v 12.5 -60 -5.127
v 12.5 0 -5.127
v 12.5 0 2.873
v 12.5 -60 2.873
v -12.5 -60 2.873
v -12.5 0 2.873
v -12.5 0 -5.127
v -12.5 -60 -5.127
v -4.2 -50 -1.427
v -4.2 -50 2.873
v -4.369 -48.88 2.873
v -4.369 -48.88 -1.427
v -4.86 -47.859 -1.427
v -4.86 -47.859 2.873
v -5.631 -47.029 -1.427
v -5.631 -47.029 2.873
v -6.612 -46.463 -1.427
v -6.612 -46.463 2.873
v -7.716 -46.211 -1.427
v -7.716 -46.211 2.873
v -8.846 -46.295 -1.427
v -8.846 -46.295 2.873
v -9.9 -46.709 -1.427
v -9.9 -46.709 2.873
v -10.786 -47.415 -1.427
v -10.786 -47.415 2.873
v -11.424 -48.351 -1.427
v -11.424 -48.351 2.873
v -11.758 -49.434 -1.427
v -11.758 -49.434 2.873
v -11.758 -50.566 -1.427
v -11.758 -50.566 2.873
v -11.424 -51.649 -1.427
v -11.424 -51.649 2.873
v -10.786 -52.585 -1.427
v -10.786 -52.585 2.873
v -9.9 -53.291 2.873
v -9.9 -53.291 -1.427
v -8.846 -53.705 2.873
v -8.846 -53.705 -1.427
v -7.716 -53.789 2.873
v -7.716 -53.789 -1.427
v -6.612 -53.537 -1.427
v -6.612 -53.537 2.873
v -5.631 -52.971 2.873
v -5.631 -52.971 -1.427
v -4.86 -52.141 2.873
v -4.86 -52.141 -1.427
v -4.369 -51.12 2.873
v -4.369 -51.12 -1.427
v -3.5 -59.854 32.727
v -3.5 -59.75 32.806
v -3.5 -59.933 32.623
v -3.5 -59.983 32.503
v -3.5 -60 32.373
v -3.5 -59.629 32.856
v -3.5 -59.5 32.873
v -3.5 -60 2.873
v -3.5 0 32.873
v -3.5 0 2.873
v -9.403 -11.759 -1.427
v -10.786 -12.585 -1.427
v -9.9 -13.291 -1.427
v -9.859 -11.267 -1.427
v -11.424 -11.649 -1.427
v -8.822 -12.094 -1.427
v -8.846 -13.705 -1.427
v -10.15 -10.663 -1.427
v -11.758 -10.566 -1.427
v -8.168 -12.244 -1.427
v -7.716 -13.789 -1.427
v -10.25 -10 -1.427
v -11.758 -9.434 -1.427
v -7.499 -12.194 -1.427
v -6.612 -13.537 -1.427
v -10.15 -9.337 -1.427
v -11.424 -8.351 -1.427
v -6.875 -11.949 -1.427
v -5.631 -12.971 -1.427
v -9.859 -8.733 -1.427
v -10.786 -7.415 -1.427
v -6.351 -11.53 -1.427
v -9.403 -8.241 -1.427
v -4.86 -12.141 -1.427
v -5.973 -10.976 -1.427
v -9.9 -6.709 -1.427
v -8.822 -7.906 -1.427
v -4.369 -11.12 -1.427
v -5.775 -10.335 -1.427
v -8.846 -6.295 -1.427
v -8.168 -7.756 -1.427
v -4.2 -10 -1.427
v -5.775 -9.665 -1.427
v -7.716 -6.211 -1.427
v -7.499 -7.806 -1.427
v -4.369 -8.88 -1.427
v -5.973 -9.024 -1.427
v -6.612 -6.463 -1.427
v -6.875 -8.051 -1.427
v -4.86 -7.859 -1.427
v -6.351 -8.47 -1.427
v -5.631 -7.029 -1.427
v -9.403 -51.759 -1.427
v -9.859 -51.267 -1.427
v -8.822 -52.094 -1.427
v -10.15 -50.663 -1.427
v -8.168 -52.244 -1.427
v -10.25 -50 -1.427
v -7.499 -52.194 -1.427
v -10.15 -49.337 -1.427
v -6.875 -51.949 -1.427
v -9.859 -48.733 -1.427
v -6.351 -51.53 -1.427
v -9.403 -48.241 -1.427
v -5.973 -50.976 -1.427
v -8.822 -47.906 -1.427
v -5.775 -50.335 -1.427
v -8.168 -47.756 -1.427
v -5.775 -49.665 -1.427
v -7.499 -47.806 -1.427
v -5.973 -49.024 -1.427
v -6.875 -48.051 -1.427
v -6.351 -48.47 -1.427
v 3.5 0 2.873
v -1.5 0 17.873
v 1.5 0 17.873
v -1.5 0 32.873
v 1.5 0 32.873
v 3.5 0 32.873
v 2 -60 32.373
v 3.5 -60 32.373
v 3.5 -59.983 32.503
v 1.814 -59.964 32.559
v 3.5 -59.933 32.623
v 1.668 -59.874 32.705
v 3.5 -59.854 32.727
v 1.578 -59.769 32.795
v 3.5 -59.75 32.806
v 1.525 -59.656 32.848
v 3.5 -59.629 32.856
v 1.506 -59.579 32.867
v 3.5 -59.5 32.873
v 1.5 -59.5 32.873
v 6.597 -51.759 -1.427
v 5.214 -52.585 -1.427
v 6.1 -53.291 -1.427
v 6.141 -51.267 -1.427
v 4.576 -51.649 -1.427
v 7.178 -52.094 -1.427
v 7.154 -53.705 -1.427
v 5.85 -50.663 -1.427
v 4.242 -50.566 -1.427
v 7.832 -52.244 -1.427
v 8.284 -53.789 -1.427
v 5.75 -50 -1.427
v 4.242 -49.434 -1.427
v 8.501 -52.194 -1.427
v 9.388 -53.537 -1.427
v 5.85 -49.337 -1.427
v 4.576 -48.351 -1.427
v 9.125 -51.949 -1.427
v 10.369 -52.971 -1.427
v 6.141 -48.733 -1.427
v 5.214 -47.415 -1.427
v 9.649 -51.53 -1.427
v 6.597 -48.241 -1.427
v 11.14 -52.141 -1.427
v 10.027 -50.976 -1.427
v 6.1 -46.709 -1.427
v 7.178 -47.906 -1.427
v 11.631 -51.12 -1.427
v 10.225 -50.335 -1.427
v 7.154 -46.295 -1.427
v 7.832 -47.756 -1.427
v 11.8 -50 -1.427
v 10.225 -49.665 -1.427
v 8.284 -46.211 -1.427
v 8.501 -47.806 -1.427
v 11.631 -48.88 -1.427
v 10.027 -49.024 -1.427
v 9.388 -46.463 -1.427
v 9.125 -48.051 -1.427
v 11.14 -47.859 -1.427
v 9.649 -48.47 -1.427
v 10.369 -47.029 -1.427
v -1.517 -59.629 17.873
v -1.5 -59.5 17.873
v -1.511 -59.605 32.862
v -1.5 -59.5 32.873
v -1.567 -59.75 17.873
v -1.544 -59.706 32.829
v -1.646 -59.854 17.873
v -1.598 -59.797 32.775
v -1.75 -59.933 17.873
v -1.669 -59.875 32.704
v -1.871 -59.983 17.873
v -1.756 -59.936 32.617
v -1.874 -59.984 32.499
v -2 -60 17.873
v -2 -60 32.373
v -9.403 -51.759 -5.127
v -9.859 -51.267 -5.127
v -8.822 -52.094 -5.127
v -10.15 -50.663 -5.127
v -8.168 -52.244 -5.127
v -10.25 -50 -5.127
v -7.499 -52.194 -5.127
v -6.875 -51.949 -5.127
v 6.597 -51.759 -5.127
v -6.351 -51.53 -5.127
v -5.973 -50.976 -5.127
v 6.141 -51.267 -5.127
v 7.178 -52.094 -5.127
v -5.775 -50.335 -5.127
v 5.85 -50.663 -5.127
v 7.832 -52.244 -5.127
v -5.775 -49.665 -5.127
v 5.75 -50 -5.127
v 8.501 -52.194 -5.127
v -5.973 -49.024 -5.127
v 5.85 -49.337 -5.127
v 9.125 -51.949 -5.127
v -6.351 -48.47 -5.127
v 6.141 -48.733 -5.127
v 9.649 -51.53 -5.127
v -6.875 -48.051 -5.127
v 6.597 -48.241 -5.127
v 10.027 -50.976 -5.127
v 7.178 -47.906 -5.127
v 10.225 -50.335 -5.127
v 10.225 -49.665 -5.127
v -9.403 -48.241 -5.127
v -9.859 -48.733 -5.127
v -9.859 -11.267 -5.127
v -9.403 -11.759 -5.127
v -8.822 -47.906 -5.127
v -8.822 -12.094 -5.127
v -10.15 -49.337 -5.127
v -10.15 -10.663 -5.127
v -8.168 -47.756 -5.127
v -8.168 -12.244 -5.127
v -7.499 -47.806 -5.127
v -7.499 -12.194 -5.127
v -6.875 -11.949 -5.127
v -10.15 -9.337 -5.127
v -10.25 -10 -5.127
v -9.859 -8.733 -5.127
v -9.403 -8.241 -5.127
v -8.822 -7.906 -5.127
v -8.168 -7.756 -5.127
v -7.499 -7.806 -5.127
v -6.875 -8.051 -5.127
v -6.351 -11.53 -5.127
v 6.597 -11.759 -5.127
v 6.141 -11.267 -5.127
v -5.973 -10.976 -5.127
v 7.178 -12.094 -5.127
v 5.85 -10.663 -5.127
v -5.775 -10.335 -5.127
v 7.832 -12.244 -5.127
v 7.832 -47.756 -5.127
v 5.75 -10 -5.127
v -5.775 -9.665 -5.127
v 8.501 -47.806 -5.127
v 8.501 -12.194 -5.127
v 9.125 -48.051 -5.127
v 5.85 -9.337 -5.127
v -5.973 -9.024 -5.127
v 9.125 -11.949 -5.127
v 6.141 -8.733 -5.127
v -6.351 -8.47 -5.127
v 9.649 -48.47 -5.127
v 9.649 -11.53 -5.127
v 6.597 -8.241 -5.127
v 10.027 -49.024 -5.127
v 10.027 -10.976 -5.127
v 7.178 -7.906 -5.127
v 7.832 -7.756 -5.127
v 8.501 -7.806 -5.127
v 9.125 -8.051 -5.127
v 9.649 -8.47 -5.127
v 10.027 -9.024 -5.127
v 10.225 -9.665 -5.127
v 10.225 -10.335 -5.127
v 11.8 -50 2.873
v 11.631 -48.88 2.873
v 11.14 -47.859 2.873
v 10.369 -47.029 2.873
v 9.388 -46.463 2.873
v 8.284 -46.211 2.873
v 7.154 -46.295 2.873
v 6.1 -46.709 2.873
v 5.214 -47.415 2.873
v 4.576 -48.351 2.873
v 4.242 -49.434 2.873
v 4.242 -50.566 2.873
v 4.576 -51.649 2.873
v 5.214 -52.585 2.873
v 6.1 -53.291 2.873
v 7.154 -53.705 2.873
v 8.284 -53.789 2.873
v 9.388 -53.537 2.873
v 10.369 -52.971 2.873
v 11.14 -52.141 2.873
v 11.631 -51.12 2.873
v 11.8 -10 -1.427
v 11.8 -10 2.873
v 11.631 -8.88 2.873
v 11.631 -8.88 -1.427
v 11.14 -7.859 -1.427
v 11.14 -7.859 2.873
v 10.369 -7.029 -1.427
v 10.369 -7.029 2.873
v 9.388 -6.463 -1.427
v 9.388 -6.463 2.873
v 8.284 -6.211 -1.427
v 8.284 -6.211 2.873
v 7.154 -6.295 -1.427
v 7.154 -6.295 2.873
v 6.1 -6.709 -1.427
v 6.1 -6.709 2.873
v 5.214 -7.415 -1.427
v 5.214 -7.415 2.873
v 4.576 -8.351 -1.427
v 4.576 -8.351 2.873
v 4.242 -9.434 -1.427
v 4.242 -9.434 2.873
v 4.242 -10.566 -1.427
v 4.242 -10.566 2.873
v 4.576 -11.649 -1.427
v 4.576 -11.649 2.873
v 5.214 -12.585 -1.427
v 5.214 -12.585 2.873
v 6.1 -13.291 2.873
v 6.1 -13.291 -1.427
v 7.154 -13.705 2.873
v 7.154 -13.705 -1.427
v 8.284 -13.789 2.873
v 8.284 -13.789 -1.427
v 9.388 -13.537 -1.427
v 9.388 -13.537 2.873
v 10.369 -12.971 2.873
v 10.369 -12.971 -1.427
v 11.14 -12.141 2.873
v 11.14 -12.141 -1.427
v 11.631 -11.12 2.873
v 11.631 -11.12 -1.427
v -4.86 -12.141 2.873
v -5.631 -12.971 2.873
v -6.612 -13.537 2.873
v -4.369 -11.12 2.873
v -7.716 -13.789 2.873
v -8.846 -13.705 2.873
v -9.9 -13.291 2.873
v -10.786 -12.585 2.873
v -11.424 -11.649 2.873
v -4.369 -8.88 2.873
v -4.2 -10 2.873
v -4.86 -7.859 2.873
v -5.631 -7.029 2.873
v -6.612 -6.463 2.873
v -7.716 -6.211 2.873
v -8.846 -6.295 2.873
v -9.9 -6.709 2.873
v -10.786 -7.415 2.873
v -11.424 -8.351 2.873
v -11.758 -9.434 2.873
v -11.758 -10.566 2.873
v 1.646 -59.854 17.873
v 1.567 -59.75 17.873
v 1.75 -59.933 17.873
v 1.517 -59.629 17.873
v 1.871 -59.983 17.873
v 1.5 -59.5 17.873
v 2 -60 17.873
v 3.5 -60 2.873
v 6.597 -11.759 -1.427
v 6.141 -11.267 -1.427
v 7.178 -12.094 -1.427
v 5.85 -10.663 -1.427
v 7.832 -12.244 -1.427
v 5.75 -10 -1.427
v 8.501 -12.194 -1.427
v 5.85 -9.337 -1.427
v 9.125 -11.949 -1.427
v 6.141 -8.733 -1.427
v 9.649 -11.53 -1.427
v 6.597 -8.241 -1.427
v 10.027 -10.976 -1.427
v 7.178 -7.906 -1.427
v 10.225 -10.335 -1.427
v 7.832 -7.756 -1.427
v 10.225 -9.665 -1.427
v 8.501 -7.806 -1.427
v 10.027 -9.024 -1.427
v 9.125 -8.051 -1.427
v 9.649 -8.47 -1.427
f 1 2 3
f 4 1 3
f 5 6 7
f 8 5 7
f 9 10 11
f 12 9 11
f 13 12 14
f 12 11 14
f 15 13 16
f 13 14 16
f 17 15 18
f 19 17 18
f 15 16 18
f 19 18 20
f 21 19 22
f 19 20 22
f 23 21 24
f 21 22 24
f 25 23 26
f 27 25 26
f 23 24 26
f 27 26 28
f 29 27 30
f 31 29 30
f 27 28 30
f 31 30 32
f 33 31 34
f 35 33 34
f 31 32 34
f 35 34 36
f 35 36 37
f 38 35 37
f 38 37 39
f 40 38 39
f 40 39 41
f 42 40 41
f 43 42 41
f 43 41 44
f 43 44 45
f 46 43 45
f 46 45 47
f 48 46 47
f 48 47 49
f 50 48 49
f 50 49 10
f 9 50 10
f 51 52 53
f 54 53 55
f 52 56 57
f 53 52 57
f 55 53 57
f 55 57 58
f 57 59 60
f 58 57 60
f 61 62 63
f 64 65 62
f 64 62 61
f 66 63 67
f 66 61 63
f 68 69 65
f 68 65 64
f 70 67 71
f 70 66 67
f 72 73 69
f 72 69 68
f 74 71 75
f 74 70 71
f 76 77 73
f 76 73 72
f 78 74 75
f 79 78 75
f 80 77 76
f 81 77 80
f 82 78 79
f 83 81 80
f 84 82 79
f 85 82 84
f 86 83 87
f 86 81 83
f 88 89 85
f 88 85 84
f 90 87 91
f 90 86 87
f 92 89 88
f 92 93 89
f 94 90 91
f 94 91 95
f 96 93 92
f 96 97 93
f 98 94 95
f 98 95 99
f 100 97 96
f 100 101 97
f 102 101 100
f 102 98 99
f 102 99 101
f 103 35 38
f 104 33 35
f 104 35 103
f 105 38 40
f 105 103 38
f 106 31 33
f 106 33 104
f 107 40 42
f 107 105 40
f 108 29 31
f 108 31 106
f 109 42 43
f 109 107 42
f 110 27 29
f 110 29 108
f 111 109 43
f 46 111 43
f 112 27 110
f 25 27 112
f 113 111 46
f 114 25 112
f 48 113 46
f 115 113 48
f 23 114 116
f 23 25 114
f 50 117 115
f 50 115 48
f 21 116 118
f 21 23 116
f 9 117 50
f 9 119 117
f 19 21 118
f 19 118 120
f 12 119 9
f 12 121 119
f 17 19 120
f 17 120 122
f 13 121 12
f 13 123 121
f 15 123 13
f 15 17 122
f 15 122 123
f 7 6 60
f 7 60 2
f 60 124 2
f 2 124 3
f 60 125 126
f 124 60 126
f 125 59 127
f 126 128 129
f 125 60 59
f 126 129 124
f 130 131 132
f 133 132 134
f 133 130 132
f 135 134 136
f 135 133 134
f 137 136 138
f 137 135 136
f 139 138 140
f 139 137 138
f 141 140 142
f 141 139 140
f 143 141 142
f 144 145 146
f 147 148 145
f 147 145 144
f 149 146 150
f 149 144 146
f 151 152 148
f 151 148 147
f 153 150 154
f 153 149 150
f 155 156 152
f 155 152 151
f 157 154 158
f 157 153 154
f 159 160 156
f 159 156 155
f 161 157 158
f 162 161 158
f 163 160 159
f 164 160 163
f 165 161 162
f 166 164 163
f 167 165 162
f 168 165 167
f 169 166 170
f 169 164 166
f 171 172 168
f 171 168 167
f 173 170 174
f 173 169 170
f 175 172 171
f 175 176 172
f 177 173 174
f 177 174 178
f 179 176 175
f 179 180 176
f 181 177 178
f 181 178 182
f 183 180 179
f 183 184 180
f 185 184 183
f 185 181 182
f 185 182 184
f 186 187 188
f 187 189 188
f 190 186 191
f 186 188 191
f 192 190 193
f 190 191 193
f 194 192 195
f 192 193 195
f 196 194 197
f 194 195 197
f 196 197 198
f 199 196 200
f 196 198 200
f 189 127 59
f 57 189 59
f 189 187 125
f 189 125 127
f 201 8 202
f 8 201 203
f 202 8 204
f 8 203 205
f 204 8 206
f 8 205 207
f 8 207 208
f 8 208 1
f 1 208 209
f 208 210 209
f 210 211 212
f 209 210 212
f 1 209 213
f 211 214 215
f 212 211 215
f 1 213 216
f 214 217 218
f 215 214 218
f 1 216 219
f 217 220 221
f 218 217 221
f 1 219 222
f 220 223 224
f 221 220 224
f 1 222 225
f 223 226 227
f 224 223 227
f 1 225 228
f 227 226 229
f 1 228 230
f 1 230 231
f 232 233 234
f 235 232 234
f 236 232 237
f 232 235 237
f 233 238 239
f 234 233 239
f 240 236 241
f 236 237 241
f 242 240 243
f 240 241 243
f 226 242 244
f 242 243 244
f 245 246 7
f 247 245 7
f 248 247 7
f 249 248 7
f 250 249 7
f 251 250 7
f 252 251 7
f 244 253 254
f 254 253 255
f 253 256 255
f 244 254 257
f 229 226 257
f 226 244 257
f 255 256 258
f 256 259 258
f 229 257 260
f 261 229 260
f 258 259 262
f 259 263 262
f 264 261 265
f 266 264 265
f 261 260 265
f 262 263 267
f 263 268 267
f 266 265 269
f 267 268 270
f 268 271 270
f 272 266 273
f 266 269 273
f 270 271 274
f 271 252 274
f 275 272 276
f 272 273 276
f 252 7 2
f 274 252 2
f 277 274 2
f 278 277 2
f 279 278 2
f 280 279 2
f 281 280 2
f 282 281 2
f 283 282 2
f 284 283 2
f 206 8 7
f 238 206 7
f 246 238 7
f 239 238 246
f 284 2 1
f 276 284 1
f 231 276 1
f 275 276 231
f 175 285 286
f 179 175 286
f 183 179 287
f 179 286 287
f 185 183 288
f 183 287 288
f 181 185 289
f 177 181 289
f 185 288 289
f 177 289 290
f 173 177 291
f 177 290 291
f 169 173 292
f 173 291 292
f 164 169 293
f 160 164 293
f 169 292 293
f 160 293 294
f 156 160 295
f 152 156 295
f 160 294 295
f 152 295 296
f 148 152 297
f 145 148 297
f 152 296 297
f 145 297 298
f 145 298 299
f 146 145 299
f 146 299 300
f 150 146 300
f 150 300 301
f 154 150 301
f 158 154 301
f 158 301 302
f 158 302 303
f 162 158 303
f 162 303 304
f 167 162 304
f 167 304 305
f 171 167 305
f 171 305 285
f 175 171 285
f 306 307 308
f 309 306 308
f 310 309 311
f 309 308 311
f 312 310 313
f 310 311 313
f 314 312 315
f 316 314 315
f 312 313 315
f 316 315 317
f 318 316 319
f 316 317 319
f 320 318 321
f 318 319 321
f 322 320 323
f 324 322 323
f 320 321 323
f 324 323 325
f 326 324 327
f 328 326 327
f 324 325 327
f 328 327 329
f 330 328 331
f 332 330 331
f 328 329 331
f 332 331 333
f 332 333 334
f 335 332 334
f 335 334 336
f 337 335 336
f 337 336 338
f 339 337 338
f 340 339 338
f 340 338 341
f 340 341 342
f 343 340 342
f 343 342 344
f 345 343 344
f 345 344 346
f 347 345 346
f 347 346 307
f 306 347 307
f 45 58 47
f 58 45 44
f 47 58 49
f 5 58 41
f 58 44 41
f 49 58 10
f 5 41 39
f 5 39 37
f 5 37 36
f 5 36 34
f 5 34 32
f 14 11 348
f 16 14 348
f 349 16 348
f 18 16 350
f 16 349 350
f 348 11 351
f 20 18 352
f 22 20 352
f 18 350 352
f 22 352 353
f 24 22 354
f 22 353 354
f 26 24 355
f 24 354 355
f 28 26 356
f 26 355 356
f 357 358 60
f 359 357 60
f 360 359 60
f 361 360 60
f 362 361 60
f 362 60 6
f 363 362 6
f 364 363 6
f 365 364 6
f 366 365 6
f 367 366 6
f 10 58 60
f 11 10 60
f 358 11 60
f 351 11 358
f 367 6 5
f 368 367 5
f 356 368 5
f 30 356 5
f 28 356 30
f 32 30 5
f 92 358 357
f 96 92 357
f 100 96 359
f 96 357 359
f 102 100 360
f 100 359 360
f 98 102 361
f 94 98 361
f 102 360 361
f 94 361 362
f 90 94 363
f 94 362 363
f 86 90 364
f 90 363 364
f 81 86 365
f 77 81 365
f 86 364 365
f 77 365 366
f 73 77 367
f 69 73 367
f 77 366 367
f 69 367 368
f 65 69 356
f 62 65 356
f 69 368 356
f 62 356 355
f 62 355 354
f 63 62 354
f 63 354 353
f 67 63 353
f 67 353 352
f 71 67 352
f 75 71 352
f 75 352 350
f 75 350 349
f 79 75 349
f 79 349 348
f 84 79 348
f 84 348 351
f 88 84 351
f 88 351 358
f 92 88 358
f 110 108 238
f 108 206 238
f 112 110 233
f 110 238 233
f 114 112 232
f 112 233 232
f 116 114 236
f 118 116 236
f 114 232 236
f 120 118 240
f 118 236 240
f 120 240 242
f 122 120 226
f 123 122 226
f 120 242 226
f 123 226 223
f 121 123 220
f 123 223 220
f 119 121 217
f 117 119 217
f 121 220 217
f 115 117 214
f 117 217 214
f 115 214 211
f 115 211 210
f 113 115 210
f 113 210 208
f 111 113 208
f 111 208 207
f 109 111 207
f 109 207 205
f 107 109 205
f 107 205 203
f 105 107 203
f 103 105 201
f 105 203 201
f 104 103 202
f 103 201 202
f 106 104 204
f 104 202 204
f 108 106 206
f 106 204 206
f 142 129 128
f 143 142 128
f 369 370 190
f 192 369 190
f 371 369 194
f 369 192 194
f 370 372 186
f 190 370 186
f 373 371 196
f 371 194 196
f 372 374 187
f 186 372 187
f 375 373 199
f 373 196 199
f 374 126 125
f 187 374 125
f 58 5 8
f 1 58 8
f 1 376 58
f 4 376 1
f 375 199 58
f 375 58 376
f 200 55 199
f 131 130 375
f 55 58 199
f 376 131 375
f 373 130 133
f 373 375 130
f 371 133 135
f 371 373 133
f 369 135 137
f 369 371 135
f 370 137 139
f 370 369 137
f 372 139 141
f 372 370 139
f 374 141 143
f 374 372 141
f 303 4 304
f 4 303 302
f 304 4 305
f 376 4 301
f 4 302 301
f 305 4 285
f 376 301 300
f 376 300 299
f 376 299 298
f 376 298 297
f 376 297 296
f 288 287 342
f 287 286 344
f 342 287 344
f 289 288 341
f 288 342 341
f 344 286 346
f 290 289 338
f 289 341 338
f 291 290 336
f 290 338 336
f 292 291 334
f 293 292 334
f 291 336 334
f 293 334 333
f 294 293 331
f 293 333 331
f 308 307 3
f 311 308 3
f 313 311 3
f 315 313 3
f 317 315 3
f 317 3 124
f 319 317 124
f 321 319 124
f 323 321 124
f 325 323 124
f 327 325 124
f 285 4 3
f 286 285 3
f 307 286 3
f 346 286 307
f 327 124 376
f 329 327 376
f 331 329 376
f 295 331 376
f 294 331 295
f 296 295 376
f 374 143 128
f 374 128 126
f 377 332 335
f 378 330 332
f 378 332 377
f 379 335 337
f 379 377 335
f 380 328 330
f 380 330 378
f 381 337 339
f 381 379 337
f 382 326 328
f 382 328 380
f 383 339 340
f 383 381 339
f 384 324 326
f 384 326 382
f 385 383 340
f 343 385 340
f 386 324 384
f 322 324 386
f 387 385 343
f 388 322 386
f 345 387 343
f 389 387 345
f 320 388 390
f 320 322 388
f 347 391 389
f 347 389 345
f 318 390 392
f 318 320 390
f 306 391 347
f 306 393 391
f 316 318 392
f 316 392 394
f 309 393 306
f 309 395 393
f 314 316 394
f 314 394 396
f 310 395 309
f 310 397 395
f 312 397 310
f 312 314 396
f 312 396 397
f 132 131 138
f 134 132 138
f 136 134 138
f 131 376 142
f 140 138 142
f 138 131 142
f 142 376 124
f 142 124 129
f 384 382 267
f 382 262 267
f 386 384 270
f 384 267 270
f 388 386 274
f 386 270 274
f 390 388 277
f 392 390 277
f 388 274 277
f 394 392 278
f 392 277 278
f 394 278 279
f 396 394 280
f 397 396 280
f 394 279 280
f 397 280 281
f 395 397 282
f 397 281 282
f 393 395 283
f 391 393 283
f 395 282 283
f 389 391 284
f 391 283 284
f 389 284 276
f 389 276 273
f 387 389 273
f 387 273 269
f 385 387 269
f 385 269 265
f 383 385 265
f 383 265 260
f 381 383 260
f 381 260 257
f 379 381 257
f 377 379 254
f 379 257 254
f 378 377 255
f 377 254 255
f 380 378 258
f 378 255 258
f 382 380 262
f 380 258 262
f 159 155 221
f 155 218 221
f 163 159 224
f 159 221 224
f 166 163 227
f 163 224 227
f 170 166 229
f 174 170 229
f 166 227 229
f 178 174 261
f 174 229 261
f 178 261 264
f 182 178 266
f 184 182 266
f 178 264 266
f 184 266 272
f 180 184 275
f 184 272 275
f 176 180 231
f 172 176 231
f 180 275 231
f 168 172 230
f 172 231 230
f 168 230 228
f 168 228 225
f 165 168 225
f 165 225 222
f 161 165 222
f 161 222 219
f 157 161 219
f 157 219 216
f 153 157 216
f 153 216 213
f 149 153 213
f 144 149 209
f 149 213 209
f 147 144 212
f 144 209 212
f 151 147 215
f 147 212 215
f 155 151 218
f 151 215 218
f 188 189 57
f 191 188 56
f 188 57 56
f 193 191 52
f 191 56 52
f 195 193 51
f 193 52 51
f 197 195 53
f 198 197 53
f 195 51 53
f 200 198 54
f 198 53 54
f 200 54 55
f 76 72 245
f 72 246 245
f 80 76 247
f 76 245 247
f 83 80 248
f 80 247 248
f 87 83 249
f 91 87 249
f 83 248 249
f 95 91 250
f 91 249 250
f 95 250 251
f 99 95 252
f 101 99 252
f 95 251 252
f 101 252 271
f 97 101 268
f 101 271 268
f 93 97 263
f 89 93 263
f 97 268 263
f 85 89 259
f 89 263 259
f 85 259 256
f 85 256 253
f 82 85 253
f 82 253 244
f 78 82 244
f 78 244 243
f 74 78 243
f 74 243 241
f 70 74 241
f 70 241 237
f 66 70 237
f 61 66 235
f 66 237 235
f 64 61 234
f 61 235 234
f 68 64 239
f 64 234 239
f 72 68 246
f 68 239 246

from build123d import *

# Parameters (mm, degrees)
F1_DEPTH       = 60
F3_D           = 4.5
F3_CBORE_D     = 7.6
F3_CBORE_DEPTH = 4.3
F4_R           = 0.5


with BuildPart() as f1:
    # F0 (on Front) → F1 (new body)
    with BuildSketch(Plane.XZ):
        Polygon((0, -5.126866), (0, 17.873134), (-1.5, 17.873134), (-1.5, 32.873134), (-3.5, 32.873134), (-3.5, 2.873134), (-12.5, 2.873134), (-12.5, -5.126866), align=None)
        Polygon((1.5, 17.873134), (0, 17.873134), (0, -5.126866), (12.5, -5.126866), (12.5, 2.873134), (3.5, 2.873134), (3.5, 32.873134), (1.5, 32.873134), align=None)
    extrude(amount=F1_DEPTH)

    # F3 (through all)
    with Locations(Plane.XY.offset(2.873134)):
        with Locations((-8, -50), (-8, -10), (8, -50), (8, -10)):
            CounterBoreHole(F3_D / 2, F3_CBORE_D / 2, F3_CBORE_DEPTH)

    # F4
    f4_edges = [f1.edges().sort_by_distance(p)[0] for p in [
        (-1.5, -60, 25.373134),
        (1.5, -60, 25.373134),
        (2.5, -60, 32.873134),
        (-2.5, -60, 32.873134),
    ]]
    fillet(f4_edges, radius=F4_R)


solid = f1.part
